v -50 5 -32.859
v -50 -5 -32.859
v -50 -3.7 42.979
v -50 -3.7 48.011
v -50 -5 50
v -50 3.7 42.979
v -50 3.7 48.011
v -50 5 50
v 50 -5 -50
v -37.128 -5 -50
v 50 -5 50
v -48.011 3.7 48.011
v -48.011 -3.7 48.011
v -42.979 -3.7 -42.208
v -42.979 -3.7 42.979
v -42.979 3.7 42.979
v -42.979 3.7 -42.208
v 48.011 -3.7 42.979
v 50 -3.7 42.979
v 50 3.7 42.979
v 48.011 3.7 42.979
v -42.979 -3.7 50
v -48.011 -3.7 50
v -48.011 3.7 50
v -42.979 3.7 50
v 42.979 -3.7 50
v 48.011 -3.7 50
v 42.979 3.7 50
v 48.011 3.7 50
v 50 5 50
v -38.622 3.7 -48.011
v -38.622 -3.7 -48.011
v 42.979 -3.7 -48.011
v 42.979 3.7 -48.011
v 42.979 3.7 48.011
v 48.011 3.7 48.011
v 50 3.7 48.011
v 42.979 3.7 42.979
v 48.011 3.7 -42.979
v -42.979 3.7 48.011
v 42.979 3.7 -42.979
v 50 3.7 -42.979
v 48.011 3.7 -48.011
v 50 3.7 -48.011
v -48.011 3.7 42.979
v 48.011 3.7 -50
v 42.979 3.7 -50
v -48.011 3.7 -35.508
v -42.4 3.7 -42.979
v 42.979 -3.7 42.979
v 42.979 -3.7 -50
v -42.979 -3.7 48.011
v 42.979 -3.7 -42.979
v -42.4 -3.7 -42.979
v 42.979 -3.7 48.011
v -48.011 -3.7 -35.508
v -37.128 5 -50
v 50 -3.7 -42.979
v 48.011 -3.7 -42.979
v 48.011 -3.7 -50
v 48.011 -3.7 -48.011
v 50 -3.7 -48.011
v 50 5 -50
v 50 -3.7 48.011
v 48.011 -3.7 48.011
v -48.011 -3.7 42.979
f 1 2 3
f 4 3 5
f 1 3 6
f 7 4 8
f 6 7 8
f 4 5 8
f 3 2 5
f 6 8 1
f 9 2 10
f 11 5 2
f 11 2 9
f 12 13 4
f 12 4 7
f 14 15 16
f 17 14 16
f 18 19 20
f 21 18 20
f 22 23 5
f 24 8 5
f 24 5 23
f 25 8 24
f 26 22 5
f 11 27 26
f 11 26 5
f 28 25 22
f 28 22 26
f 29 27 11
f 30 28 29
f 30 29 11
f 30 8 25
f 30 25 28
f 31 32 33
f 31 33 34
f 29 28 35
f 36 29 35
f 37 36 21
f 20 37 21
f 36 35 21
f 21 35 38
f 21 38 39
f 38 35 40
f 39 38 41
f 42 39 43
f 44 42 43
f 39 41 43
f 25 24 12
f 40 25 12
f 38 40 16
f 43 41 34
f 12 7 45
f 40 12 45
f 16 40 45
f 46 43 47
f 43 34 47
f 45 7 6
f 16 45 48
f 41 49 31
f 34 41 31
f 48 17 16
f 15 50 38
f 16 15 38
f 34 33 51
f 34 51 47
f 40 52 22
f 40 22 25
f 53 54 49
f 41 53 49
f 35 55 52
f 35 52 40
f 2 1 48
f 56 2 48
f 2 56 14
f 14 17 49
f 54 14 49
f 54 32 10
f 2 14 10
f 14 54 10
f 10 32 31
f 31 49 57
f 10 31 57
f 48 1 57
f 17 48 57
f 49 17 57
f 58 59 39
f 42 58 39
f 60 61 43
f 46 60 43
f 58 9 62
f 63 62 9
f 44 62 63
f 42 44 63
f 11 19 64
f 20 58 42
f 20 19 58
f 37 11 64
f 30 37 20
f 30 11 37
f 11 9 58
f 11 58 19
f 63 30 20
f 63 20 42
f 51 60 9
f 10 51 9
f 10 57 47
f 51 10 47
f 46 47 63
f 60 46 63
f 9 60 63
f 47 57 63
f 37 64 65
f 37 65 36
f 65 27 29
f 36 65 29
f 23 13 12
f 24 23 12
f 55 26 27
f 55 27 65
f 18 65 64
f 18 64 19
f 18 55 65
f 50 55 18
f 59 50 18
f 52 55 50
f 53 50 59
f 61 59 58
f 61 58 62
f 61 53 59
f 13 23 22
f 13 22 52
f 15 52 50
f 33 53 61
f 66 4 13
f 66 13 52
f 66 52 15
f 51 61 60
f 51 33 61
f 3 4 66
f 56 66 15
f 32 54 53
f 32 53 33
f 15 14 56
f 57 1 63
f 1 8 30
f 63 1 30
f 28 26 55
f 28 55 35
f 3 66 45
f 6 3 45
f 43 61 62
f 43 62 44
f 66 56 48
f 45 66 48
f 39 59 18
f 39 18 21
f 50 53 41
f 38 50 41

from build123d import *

# Parameters (mm, degrees)
SKETCH1_W               = 100
SKETCH1_H               = 10
BOSS_EXTRUDE1_DEPTH     = 50
SKETCH2_W               = 5.031669049
SKETCH2_H               = 7.399484506
CUT_EXTRUDE1_DEPTH      = 112.915146428
MIRROR2_COPY_1_SKETCH_W = 5.031669049
MIRROR2_COPY_1_SKETCH_H = 7.399484506
MIRROR2_COPY_1_DEPTH    = 112.915146428
MIRROR2_COPY_2_SKETCH_W = 5.031669049
MIRROR2_COPY_2_SKETCH_H = 7.399484506
MIRROR2_COPY_2_DEPTH    = 112.915146428
CUT_EXTRUDE2_DEPTH      = 72.414284285


with BuildPart() as part:
    # Sketch1 → Boss-Extrude1 (new, symmetric)
    with BuildSketch(Plane.XY):
        Rectangle(SKETCH1_W, SKETCH1_H)
    extrude(amount=BOSS_EXTRUDE1_DEPTH, both=True)

    # Sketch2 → Cut-Extrude1 (cut, through all)
    with BuildSketch(Plane.XY.offset(50)):
        with Locations((45.494674326, 0)):
            Rectangle(SKETCH2_W, SKETCH2_H)
    cut_extrude1 = extrude(amount=-CUT_EXTRUDE1_DEPTH, mode=Mode.SUBTRACT)

    # Mirror1: Cut-Extrude1 across plane
    add(cut_extrude1.mirror(Plane(origin=(0, 0, 0), x_dir=(0.7071067811865476, 0, 0.7071067811865476), z_dir=(-0.7071067811865477, 0, 0.7071067811865475))), mode=Mode.SUBTRACT)

    # Mirror2 copy 1 sketch → Mirror2 copy 1 (cut, through all)
    with BuildSketch(Plane(origin=(0, 0, -50), x_dir=(-1, 0, 0), z_dir=(0, 0, -1))):
        with Locations((45.494674326, 0)):
            Rectangle(MIRROR2_COPY_1_SKETCH_W, MIRROR2_COPY_1_SKETCH_H)
    extrude(amount=-MIRROR2_COPY_1_DEPTH, mode=Mode.SUBTRACT)

    # Mirror2 copy 2 sketch → Mirror2 copy 2 (cut, through all)
    with BuildSketch(Plane(origin=(-50, 0, 0), x_dir=(0, 0, -1), z_dir=(-1, 0, 0))):
        with Locations((45.494674326, 0)):
            Rectangle(MIRROR2_COPY_2_SKETCH_W, MIRROR2_COPY_2_SKETCH_H)
    extrude(amount=-MIRROR2_COPY_2_DEPTH, mode=Mode.SUBTRACT)

    # Sketch3 → Cut-Extrude2 (cut, through all)
    with BuildSketch(Plane(origin=(0, 5, 0), x_dir=(1, 0, 0), z_dir=(0, 1, 0))):
        Polygon((-226.207235665, -201.784596614), (-53.944301898, 27.606350902), (-24.696492293, 66.553689202), (147.566441474, 295.944636718), (-311.215453559, 640.470504252), (-684.989130698, 142.74127092), align=None)
    extrude(amount=-CUT_EXTRUDE2_DEPTH, mode=Mode.SUBTRACT)


solid = part.part
